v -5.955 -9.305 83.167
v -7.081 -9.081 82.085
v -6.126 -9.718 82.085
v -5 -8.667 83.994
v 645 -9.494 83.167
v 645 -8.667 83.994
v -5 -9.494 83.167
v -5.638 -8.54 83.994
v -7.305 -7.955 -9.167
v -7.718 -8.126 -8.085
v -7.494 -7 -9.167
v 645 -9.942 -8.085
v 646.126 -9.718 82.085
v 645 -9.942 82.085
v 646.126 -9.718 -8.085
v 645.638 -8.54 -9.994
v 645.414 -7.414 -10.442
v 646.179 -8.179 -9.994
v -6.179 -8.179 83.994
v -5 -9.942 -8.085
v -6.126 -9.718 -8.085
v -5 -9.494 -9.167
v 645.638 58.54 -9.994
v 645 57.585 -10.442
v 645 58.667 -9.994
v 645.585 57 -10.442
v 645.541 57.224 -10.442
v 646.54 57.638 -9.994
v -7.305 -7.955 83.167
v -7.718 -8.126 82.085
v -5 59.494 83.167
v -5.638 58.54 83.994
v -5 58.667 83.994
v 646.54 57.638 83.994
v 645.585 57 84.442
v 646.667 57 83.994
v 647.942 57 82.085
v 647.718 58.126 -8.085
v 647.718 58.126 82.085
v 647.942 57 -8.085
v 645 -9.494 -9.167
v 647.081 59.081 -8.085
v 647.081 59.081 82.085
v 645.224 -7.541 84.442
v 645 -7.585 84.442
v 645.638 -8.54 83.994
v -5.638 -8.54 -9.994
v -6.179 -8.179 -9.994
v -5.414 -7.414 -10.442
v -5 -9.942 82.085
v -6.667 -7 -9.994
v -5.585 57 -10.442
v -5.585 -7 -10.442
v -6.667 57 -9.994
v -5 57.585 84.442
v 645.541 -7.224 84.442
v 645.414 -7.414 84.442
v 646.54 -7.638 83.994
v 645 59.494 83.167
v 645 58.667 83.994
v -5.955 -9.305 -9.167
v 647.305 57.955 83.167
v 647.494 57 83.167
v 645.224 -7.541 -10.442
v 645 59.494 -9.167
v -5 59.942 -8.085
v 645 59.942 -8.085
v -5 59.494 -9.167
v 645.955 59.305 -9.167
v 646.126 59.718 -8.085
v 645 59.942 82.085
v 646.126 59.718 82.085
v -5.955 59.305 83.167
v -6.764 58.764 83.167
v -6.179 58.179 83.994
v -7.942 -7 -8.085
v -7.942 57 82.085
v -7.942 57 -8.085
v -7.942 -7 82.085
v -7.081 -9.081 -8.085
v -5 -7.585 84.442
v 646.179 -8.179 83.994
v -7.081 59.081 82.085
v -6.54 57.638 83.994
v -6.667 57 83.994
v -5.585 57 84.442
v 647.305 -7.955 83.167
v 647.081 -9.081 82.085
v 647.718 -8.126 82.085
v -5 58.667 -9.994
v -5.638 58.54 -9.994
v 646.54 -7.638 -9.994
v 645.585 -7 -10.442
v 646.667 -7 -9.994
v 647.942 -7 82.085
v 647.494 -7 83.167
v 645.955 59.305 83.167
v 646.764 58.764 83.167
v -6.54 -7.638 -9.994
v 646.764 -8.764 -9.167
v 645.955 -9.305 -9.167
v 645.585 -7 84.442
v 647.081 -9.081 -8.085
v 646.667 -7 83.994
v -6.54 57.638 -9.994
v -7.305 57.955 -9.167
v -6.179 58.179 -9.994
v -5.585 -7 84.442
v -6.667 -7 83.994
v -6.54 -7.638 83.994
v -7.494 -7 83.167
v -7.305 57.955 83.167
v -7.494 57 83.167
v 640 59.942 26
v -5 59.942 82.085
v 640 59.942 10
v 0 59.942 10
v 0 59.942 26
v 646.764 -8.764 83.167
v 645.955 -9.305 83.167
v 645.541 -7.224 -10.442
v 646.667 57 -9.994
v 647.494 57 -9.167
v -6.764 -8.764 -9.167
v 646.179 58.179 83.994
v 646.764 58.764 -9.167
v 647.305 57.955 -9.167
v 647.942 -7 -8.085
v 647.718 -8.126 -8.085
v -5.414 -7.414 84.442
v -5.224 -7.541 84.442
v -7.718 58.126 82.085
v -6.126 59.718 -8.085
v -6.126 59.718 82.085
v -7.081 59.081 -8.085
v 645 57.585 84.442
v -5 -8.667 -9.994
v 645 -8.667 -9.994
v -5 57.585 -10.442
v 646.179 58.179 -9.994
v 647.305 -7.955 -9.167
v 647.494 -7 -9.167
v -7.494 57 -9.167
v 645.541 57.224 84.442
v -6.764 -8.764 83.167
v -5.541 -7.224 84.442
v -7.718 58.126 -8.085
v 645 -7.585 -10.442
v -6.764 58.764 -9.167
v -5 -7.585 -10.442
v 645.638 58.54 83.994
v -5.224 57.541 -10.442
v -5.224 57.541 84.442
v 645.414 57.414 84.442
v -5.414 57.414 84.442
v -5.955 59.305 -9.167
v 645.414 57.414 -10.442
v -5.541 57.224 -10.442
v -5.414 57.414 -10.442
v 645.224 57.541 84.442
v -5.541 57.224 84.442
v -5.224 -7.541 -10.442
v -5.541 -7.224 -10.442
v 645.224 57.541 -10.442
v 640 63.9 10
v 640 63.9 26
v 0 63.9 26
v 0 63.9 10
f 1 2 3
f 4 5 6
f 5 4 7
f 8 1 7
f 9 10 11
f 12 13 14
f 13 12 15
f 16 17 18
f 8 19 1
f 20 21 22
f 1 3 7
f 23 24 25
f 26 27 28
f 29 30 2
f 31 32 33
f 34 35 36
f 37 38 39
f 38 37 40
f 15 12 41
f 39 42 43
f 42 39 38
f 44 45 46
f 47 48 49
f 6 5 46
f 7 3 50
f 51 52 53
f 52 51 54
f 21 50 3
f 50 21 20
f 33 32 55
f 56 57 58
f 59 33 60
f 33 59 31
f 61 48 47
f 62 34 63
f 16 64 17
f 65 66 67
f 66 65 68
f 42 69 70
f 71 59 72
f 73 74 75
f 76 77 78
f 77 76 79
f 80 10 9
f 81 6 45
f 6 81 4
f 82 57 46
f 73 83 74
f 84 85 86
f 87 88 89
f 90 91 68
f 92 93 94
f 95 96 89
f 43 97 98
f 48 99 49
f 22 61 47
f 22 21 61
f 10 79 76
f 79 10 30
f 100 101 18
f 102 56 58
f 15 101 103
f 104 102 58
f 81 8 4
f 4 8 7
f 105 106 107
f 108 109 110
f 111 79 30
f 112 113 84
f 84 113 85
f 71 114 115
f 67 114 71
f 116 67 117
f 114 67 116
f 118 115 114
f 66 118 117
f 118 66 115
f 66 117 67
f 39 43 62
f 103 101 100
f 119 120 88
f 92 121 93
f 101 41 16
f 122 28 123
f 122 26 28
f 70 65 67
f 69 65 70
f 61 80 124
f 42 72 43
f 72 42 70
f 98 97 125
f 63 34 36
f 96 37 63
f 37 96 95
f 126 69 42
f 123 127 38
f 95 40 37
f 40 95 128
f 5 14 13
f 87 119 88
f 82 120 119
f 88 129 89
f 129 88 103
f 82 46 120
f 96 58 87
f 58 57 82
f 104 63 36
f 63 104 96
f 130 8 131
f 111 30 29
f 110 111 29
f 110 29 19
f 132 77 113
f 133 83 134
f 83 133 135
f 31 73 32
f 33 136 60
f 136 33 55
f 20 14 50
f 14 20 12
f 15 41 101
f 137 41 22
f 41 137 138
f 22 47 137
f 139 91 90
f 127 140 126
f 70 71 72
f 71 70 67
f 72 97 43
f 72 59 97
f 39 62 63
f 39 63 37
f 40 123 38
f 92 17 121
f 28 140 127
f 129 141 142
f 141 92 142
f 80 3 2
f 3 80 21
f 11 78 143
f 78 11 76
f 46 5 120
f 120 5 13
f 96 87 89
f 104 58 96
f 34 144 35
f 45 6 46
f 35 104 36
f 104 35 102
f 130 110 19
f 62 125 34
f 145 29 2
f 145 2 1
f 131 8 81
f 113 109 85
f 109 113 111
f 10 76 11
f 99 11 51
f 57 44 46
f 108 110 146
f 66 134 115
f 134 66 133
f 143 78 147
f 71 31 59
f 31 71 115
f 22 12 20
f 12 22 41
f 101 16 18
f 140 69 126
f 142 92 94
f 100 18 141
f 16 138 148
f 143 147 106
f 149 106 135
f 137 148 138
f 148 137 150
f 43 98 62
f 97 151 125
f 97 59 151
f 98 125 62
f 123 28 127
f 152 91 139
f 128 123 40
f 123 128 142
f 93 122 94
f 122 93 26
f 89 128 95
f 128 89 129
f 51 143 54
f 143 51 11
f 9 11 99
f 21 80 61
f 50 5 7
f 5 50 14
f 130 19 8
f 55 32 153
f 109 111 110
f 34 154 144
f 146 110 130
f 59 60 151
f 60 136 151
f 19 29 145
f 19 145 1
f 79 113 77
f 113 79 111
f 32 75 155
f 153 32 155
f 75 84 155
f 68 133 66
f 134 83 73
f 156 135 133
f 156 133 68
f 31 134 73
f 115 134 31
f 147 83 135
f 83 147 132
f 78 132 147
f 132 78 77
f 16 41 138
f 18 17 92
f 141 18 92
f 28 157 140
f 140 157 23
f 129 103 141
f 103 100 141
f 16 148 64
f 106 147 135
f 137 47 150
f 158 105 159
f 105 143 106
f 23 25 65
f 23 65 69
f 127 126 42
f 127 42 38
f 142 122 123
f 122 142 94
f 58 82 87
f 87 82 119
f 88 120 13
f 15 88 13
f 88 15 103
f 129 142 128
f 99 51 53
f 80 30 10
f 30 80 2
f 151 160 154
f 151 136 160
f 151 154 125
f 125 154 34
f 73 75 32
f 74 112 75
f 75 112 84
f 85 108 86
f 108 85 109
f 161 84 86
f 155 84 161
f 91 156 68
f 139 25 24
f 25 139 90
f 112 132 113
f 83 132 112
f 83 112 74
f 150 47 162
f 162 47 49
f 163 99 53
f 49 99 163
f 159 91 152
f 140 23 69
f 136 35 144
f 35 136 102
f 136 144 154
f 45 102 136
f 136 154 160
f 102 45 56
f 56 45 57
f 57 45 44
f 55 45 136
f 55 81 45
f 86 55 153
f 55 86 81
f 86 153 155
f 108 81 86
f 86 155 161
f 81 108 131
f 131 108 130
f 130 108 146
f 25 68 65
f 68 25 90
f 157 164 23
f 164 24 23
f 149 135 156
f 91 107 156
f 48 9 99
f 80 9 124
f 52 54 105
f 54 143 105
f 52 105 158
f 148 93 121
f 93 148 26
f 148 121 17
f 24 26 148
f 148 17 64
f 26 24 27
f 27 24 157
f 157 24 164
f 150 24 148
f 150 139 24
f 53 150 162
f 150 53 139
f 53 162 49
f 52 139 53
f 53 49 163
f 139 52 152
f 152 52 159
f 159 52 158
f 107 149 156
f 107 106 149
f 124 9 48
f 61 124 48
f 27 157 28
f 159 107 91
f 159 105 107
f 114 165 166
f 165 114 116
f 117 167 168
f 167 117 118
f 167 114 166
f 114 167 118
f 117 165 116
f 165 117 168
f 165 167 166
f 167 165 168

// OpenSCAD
// Perfect Roadster — downtube internal envelope + outer tube suggestion
// Units: mm
// Cavity must clear three trays (see pack-stack.scad)

cavity_l = 640;
cavity_w = 56;
cavity_h = 80;

// Outer teardrop / oval approximation (extruded profile)
outer_w = 70;
outer_h = 95;
wall = 2.5;

module cavity() {
  color([0.9, 0.6, 0.1, 0.4])
    cube([cavity_l, cavity_w, cavity_h]);
}

module outer_tube() {
  // simplified rectangular outer with rounded suggestion via Minkowski
  color([0.6, 0.6, 0.65, 0.25])
    minkowski() {
      translate([-5, (cavity_w - outer_w) / 2, (cavity_h - outer_h) / 2])
        cube([cavity_l + 10, outer_w - 6, outer_h - 6]);
      sphere(r = 3, $fn = 16);
    }
}

module wire_channel() {
  // channel along wall for main leads
  color([0.2, 0.4, 0.9, 0.5])
    translate([0, cavity_w - 0.1, 10])
      cube([cavity_l, 8, 16]);
}

outer_tube();
cavity();
wire_channel();

echo("cavity_lwh", cavity_l, cavity_w, cavity_h);
echo("outer_wh_approx", outer_w, outer_h);
echo("note", "Builder should loft a teardrop matching Roadster silhouette around this cavity");
